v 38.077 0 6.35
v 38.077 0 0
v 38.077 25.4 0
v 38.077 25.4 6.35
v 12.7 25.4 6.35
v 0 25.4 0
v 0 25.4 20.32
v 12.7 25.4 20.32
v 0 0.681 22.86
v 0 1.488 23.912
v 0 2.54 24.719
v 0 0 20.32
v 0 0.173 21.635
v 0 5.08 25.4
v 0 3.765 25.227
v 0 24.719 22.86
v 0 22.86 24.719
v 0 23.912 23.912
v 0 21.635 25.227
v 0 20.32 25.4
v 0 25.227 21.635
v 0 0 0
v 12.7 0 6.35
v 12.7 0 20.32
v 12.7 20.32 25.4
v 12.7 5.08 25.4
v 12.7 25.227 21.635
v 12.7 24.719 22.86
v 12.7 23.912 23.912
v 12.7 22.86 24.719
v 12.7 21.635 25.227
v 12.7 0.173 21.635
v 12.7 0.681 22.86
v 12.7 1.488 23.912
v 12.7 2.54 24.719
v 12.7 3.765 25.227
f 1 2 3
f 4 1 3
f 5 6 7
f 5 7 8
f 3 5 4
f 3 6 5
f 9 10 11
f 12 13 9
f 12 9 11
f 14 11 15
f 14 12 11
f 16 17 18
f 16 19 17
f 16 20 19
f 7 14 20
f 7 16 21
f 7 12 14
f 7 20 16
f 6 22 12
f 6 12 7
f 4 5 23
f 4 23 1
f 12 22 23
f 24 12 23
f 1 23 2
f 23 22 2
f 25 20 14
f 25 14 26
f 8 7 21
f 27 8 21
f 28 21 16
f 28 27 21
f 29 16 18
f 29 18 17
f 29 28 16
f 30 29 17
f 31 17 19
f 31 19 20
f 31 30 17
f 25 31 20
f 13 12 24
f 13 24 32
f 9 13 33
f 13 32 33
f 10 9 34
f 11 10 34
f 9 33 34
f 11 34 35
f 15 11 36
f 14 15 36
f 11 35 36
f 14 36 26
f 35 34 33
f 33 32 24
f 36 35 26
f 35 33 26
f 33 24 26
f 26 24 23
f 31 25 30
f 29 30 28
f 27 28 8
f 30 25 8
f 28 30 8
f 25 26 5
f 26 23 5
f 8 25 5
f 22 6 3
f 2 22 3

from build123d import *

# Parameters (mm, degrees)
F0_W     = 12.7
F0_H     = 25.4
F2_DEPTH = 25.4
F1_W     = 25.4
F1_H     = 25.4
F3_DEPTH = 6.35
F4_R     = 5.08


with BuildPart() as f2:
    # F0 (on Top) → F2 (new body)
    with BuildSketch(Plane.XY):
        with Locations((6.35, 12.7)):
            Rectangle(F0_W, F0_H)
    extrude(amount=F2_DEPTH)

    # F1 (on Top) → F3 (join)
    with BuildSketch(Plane.XY):
        with Locations((25.376793, 12.7)):
            Rectangle(F1_W, F1_H)
    extrude(amount=F3_DEPTH)

    # F4
    f4_edges = [f2.edges().sort_by_distance(p)[0] for p in [
        (6.35, 0, 25.4),
        (6.35, 25.4, 25.4),
    ]]
    fillet(f4_edges, radius=F4_R)


solid = f2.part
